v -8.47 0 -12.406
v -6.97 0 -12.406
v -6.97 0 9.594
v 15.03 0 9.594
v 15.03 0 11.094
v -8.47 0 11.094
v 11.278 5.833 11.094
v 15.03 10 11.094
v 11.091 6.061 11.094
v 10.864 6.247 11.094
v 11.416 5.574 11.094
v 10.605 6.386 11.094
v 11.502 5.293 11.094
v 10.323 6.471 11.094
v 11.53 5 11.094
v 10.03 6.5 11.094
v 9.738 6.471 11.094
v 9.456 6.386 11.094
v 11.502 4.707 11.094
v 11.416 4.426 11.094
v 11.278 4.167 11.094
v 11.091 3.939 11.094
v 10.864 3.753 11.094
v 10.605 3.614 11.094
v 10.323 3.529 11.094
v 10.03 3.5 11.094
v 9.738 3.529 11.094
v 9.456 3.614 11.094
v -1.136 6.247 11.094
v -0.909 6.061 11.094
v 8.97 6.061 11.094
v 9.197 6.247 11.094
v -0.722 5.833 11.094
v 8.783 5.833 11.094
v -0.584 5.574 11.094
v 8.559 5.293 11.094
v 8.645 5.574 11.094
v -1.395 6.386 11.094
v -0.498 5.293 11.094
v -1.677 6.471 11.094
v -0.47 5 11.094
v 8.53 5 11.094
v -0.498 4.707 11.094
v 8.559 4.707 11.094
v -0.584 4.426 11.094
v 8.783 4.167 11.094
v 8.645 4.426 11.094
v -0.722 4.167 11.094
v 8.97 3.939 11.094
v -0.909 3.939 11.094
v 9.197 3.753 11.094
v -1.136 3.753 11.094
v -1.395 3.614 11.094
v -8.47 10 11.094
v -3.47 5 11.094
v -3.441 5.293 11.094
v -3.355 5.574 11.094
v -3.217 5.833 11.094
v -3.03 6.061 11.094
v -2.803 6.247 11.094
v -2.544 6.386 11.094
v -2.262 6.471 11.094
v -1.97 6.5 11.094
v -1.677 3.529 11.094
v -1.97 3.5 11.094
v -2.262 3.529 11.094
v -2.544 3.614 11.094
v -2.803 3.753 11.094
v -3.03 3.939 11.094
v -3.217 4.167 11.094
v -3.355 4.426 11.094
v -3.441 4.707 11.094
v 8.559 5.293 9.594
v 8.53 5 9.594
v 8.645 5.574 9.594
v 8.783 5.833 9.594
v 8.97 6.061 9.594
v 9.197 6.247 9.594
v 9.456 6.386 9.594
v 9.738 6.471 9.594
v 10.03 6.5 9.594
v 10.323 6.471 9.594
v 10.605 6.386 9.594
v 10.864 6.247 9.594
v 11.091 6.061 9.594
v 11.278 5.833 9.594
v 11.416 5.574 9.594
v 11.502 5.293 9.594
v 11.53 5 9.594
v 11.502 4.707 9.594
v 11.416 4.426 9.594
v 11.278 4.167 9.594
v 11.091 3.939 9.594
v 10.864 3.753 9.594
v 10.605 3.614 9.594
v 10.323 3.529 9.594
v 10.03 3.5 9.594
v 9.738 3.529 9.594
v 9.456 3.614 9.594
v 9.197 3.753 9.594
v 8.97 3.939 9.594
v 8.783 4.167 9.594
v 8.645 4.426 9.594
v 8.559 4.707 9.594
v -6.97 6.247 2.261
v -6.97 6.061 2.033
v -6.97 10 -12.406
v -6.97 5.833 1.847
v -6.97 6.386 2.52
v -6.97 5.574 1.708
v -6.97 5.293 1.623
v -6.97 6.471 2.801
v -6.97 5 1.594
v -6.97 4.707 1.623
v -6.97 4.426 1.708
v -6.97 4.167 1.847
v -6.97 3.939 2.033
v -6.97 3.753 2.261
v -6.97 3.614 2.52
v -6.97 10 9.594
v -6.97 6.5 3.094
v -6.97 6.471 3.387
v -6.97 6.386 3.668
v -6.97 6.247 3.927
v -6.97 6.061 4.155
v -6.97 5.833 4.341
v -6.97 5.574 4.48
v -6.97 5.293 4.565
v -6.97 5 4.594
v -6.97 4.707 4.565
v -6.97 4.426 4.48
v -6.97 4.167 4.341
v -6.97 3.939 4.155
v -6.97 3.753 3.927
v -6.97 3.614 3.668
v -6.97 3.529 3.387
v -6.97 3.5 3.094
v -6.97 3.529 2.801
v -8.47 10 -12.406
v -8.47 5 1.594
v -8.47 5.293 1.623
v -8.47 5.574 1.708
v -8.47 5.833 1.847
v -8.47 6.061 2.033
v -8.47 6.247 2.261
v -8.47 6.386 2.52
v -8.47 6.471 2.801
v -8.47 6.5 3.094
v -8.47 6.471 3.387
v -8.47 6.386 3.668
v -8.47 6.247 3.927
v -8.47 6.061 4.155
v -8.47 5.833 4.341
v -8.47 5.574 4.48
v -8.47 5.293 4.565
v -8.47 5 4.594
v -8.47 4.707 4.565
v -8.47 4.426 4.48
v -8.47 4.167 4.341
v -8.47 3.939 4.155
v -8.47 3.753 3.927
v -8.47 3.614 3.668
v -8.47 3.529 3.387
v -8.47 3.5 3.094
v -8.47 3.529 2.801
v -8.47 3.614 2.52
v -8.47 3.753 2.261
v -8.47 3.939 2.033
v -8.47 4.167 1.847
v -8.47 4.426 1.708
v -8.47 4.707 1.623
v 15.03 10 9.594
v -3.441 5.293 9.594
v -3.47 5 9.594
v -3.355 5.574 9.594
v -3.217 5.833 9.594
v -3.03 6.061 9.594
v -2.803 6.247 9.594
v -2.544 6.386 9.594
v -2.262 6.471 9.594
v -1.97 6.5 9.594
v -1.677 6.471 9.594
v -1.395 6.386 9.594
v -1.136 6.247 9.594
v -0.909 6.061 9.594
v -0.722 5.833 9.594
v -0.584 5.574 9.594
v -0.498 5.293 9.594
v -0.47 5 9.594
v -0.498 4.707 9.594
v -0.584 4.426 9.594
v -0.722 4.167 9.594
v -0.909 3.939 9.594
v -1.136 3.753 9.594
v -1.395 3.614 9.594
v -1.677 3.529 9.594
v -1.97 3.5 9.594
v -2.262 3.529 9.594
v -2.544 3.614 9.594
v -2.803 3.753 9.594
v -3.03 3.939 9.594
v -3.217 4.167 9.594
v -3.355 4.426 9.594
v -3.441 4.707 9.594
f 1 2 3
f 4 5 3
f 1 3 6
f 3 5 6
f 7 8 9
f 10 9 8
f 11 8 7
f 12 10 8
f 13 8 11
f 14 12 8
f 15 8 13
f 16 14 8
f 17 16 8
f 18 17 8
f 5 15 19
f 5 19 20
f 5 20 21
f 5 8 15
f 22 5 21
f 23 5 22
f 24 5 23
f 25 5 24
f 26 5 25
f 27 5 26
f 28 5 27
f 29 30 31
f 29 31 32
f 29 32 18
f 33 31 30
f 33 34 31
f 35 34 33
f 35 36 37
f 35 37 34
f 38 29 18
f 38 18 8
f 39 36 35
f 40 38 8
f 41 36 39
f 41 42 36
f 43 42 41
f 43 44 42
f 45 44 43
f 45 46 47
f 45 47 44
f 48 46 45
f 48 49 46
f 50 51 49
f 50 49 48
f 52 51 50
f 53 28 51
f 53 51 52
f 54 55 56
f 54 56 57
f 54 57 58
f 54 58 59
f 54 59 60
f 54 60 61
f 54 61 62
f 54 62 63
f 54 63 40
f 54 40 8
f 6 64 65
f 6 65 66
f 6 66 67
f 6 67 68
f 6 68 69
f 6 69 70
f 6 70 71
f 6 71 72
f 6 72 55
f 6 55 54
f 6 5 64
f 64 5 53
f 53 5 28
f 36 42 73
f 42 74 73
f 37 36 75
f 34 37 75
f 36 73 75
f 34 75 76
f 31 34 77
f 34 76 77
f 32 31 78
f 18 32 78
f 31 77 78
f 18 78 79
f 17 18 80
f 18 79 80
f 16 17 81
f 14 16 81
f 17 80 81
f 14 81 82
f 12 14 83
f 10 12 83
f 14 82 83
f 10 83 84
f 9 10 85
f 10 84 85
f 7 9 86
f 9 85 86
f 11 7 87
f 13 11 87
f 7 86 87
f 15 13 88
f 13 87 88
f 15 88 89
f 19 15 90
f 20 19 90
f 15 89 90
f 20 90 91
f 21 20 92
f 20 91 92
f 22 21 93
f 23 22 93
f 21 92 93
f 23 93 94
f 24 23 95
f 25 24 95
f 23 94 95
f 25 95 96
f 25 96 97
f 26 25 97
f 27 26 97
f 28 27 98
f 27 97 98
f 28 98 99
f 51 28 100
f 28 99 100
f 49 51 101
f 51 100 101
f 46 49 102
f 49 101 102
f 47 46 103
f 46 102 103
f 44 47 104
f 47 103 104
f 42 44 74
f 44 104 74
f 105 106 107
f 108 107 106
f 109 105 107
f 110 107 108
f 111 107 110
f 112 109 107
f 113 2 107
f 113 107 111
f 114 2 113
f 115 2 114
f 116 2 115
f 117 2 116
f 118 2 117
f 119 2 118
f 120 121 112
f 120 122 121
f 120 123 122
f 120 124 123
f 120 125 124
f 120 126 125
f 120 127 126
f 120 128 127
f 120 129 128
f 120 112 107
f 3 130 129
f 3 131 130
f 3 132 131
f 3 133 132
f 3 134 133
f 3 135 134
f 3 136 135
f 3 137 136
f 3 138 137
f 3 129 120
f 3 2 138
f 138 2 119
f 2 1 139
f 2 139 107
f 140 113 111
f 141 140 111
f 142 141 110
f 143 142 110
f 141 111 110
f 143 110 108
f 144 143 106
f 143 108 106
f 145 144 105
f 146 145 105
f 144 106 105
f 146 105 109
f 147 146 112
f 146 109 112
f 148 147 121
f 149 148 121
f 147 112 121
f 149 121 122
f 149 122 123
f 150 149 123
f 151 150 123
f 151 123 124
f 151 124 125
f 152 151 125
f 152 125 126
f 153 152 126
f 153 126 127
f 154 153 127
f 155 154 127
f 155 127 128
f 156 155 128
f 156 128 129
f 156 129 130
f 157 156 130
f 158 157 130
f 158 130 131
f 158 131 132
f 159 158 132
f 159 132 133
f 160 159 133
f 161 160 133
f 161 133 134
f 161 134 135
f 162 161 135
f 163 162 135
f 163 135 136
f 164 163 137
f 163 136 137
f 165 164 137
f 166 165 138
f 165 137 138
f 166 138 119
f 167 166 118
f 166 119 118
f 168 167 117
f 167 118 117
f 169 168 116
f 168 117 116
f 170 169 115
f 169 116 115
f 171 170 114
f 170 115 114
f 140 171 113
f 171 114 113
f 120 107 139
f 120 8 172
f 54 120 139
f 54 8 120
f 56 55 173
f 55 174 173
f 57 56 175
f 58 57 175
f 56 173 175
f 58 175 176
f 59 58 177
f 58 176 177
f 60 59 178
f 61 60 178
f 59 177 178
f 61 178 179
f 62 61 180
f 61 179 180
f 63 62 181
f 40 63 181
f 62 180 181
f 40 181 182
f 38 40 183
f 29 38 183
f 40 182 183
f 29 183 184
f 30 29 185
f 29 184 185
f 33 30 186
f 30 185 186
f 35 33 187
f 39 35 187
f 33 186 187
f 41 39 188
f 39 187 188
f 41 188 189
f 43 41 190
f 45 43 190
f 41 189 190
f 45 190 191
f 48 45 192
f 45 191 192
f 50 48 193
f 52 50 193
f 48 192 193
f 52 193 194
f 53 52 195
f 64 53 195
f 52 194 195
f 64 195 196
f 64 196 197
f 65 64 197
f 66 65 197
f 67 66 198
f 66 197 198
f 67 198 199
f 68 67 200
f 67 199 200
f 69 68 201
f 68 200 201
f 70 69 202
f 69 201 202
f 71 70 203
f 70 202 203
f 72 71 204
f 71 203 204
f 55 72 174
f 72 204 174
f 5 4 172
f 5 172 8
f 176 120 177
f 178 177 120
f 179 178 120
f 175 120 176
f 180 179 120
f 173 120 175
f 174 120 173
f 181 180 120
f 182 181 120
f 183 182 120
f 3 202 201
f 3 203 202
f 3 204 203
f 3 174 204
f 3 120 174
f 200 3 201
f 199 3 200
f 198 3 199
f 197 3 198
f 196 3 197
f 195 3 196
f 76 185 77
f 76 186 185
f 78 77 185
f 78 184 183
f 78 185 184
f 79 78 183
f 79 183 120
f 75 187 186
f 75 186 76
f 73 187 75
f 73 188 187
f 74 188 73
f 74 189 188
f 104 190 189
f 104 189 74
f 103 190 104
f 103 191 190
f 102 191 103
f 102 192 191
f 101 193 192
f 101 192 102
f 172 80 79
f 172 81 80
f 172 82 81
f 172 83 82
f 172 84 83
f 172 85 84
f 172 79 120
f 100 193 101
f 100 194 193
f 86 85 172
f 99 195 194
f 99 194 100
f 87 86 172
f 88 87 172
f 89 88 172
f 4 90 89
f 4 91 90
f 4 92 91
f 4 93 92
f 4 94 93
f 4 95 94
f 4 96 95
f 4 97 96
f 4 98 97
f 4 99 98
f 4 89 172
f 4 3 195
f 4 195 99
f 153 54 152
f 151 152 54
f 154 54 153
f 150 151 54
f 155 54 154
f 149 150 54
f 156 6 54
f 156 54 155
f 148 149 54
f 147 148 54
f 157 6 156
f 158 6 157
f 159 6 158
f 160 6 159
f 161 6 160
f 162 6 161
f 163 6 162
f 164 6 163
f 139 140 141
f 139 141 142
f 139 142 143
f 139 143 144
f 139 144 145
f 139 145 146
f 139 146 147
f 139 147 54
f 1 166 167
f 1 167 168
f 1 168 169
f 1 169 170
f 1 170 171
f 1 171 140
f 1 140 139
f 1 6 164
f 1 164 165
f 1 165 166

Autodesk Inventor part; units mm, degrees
ref_plane "YZ Plane" through (0, 0, 0) normal (1, 0, 0) x (0, 1, 0)
ref_plane "XZ Plane" through (0, 0, 0) normal (0, 1, 0) x (-1, 0, 0)
ref_plane "XY Plane" through (0, 0, 0) normal (0, 0, 1) x (1, 0, 0)
sketch "Sketch1" plane through (0, 0, 0) normal (0, 1, 0) x (-1, 0, 0)
  line L0 (-15.0305, 11.0939) -> (8.4695, 11.0939)
  line L1 (8.4695, 11.0939) -> (8.4695, -12.4061)
  line L2 (8.4695, -12.4061) -> (6.9695, -12.4061)
  line L3 (6.9695, -12.4061) -> (6.9695, 9.5939)
  line L4 (6.9695, 9.5939) -> (-15.0305, 9.5939)
  line L5 (-15.0305, 9.5939) -> (-15.0305, 11.0939)
  point P0 (0, 0)
  dimension "d0" = 23.5
  dimension "d1" = 23.5
  dimension "d2" = 1.5
  dimension "d3" = 1.5
extrude "Extrusion1" add sketch "Sketch1" along normal blind 10
sketch "Sketch2" plane through (15.0305, 0, 9.5939) normal (0, 0, -1) x (-1, 0, 0)
  circle A0 centre (5, 5) radius 1.5
  circle A1 centre (17, 5) radius 1.5
  line L0 (0, 10) -> (22, 10) projected
  line L1 (0, 0) -> (0, 10) projected
  line L2 (23.5, 0) -> (23.5, 10) projected
  point P0 (15.0305, 0)
  dimension "d6" = 3
  dimension "d7" = 3
  dimension "d8" = 5
  dimension "d9" = 5
  dimension "d10" = 5
  dimension "d11" = 6.5
extrude "Extrusion2" cut sketch "Sketch2" against normal up to next
sketch "Sketch3" plane through (-6.9695, 0, 9.5939) normal (1, 0, 0) x (0, 0, -1)
  circle A0 centre (6.5, 5) radius 1.5
  line L0 (0, 10) -> (22, 10) projected
  line L1 (-1.5, 0) -> (-1.5, 10) projected
  point P0 (9.5939, 0)
  dimension "d14" = 3
  dimension "d15" = 5
  dimension "d16" = 8
extrude "Extrusion3" cut sketch "Sketch3" against normal up to next
properties part number "equerre_basse"
